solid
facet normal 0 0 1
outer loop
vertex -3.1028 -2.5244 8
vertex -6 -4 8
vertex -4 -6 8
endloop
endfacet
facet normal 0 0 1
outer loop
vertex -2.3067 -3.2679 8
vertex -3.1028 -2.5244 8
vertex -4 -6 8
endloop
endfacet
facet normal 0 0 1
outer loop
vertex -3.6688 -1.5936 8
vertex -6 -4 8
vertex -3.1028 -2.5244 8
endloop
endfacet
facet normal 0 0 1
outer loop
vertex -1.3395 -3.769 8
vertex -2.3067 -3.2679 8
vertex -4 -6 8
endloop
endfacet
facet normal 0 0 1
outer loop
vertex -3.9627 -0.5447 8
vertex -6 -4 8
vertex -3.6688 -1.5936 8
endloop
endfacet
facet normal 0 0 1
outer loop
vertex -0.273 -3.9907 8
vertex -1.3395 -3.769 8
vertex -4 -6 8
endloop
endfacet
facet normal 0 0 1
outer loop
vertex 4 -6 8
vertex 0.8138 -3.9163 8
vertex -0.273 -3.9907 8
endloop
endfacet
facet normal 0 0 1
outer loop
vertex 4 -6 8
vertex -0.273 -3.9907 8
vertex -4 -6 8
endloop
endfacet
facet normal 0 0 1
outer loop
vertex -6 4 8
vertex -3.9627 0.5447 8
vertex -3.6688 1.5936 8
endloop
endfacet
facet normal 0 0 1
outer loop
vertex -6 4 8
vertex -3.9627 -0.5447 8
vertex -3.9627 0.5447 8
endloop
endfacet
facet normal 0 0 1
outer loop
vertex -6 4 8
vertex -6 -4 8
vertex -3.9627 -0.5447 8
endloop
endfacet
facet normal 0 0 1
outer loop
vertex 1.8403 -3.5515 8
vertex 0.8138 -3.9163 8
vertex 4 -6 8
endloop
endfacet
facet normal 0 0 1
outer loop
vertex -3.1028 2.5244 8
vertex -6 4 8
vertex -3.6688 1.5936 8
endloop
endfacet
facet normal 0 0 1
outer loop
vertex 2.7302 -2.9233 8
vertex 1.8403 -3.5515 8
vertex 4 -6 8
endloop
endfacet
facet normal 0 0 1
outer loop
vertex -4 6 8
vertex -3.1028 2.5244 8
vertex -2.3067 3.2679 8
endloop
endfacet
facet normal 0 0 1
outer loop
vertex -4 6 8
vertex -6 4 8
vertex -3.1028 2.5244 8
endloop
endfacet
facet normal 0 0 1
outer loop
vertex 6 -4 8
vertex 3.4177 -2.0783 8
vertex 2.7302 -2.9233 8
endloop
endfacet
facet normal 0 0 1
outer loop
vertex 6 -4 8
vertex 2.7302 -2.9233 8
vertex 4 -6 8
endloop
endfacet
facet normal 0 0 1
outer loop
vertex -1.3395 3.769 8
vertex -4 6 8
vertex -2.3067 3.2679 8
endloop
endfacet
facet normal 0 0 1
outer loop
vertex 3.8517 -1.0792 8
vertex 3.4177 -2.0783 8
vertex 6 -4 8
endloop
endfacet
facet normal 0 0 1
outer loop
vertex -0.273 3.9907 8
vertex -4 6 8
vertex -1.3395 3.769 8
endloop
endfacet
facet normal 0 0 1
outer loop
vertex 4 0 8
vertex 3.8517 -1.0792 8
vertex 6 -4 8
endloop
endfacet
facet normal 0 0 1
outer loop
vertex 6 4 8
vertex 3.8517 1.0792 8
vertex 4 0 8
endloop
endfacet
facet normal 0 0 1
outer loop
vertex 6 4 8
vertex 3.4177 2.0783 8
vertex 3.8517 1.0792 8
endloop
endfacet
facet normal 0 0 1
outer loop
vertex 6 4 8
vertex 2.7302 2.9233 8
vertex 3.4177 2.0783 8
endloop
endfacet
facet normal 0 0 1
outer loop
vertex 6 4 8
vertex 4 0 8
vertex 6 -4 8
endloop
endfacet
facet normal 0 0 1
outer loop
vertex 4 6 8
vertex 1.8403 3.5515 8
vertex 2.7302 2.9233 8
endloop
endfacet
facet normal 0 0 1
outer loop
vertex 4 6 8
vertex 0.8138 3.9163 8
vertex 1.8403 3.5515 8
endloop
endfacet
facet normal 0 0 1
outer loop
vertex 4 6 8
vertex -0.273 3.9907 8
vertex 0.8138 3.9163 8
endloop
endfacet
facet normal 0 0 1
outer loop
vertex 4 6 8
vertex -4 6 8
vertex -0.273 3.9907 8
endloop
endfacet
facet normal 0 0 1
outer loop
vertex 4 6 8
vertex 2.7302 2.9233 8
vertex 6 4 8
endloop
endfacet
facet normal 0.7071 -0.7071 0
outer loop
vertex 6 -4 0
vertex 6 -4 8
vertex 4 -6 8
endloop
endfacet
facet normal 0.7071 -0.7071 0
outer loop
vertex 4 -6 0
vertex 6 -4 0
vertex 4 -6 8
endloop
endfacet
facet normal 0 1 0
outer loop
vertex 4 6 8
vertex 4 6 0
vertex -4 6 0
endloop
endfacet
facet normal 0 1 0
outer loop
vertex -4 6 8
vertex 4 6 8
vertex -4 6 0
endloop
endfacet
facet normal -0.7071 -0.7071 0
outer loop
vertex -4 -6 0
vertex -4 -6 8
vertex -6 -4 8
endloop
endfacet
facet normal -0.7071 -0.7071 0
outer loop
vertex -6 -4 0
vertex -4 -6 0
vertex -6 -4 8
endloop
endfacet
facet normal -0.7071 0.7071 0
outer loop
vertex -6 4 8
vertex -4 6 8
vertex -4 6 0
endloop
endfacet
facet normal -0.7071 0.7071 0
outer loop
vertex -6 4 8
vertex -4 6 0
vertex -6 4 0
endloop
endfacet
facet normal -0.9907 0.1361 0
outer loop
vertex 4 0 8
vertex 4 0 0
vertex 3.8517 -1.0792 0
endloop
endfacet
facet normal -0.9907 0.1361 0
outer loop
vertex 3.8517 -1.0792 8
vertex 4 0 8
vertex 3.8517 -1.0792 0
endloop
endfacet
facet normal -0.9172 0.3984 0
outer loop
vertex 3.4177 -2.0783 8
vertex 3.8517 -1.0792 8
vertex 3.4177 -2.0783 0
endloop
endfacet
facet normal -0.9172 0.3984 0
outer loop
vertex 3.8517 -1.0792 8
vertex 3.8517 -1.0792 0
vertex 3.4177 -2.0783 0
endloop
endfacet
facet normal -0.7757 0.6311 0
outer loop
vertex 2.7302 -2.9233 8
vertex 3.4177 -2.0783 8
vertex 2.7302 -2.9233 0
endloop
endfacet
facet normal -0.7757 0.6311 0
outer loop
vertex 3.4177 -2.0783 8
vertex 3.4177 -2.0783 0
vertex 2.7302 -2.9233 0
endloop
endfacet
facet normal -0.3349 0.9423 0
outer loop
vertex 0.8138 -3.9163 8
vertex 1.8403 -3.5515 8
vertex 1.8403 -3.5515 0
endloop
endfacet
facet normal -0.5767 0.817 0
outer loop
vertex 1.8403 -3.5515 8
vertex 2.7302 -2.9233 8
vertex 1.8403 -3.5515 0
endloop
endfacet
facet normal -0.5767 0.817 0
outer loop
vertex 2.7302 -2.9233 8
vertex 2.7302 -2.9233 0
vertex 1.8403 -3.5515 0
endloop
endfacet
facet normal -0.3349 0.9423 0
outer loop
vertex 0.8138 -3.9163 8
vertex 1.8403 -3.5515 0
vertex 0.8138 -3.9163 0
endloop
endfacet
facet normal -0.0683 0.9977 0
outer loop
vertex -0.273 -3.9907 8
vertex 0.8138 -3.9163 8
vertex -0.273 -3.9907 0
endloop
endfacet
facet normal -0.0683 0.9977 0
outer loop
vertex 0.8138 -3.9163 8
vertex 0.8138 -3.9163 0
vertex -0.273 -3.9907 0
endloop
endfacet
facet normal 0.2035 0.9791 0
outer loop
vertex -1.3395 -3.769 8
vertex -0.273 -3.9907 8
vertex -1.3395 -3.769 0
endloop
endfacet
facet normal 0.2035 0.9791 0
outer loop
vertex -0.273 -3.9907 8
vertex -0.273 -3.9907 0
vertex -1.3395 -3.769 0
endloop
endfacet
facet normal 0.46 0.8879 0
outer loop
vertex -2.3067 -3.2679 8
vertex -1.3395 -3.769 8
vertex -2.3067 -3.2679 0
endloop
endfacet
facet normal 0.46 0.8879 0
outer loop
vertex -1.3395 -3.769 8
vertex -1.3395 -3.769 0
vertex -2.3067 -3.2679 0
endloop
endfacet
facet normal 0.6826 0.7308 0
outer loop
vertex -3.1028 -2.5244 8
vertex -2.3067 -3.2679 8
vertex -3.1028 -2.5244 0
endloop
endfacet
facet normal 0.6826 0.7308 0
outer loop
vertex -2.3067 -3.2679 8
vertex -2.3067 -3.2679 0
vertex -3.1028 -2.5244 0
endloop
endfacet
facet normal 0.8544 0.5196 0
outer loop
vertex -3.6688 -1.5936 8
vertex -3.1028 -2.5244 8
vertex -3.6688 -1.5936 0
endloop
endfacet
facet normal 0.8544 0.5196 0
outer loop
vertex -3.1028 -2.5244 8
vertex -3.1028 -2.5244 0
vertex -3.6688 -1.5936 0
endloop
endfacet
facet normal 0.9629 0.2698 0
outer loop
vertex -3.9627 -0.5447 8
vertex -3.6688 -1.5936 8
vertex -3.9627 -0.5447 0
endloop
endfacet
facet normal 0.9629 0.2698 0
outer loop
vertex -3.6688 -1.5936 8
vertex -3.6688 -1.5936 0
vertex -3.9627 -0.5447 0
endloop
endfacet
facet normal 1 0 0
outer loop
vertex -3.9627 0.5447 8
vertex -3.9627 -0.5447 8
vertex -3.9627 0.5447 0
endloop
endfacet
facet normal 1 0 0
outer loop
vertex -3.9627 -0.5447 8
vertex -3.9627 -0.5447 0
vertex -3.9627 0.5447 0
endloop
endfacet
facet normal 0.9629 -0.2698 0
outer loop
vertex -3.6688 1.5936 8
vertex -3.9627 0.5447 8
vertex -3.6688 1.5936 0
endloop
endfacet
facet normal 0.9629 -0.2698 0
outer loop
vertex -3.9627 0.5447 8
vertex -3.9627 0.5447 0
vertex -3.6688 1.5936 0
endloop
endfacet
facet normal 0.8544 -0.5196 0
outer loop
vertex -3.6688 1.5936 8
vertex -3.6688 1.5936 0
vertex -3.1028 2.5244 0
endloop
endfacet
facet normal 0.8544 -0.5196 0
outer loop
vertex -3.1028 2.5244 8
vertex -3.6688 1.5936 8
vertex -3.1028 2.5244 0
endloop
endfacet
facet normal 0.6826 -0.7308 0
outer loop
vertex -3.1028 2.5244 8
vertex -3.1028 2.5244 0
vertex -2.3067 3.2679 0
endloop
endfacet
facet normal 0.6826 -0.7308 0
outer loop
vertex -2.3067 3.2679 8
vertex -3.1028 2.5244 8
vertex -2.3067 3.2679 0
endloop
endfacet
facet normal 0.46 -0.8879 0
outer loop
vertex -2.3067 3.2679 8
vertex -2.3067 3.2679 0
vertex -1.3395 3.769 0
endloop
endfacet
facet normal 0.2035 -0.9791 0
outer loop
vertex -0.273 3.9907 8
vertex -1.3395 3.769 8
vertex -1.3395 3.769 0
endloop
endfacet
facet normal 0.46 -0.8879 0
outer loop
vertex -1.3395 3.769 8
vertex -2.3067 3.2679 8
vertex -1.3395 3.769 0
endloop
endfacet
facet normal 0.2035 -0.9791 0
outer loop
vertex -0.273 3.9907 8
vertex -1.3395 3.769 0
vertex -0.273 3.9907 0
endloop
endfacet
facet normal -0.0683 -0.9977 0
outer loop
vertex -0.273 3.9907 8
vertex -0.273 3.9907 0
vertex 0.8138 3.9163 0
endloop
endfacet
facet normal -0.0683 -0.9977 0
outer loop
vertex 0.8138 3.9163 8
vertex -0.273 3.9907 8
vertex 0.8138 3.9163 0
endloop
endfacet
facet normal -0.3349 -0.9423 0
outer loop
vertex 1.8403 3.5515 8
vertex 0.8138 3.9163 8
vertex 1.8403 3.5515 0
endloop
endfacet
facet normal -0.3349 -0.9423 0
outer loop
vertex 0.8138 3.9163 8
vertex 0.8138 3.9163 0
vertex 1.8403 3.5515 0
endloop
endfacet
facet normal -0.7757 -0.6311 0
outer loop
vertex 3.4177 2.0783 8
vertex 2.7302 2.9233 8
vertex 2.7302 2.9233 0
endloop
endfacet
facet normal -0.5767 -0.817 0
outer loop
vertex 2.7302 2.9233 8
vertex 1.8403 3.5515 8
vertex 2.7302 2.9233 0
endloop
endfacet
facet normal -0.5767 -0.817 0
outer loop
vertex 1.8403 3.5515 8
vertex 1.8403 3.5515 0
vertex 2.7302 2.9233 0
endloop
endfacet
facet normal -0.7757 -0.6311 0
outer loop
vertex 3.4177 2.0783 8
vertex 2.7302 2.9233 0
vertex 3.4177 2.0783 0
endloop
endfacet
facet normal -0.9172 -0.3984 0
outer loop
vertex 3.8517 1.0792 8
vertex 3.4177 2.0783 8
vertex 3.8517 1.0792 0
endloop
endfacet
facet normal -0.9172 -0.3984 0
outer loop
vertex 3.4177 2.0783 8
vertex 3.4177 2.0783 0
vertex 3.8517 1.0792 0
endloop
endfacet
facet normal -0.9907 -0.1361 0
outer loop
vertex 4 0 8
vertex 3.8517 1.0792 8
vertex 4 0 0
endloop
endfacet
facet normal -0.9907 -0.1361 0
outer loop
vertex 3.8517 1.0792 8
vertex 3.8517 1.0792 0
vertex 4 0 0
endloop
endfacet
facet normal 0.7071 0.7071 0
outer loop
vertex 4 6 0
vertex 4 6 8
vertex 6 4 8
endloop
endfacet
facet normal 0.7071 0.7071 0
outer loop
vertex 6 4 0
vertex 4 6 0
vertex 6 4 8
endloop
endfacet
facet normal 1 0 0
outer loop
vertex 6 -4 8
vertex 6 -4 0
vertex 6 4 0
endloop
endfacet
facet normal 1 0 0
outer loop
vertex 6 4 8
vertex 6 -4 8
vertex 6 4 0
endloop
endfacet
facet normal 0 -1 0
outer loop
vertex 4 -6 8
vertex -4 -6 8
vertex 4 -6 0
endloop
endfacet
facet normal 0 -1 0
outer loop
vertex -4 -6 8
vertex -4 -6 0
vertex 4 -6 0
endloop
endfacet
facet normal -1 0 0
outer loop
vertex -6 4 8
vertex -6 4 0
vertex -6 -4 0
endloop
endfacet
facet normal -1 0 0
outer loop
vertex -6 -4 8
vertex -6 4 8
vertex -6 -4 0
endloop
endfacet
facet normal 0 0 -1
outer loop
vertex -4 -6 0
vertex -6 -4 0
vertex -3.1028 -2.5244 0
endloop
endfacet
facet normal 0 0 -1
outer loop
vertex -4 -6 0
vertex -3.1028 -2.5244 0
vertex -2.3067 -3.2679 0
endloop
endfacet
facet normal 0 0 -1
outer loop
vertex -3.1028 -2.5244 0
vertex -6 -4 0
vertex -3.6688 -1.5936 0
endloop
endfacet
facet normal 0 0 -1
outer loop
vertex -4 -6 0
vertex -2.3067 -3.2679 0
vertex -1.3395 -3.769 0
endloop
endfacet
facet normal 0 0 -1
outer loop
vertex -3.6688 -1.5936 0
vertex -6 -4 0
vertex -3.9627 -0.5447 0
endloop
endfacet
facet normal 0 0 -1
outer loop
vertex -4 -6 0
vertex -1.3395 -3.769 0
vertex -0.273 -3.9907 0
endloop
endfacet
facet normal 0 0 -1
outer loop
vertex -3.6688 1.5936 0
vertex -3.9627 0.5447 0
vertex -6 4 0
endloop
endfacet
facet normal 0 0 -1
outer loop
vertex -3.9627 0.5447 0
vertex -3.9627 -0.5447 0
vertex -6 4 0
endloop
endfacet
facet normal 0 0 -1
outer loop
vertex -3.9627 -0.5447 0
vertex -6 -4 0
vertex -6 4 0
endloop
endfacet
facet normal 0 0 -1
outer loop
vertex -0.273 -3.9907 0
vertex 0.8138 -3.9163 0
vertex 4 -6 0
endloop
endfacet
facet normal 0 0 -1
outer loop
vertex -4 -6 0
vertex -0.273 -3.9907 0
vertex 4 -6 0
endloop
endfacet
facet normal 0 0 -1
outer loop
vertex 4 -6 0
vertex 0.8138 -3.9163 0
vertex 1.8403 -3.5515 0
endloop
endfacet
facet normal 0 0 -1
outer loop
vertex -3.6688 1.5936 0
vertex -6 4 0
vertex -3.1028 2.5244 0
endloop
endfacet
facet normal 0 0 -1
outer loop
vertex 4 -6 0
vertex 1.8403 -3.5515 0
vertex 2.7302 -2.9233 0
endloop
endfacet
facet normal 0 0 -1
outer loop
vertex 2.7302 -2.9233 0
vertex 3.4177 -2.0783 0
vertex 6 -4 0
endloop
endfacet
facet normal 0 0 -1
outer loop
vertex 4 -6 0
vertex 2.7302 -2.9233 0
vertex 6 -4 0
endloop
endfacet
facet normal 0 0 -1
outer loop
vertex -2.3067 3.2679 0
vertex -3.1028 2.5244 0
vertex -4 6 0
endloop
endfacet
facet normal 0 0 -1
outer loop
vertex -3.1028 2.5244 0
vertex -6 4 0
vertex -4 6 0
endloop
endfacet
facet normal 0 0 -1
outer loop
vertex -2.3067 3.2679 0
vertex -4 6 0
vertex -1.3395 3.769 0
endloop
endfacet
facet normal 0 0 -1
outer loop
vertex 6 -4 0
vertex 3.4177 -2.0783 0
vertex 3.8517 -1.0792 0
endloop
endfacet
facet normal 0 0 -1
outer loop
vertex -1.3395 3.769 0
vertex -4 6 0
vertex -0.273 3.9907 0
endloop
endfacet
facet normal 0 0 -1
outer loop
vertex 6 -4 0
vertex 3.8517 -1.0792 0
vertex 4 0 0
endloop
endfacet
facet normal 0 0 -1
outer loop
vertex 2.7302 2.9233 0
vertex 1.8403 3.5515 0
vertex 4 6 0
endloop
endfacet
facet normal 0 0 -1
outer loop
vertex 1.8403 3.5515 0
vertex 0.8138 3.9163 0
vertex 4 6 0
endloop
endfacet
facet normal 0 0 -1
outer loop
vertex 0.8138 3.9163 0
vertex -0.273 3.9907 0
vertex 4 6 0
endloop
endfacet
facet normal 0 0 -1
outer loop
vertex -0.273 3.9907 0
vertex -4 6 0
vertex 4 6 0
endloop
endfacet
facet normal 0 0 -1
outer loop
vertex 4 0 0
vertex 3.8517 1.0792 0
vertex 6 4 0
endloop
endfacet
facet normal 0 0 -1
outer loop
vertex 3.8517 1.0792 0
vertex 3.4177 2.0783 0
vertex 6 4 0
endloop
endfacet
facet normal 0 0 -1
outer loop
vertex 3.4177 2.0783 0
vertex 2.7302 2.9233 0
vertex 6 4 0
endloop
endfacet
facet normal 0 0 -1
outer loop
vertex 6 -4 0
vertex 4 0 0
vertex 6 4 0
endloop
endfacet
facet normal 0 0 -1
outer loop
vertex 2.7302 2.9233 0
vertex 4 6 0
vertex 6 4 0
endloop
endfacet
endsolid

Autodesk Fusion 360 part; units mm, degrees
sketch "Sketch1" plane through (0, 0, 0) normal (0, 0, 1) x (1, 0, 0)
  circle A0 centre (0, 0) radius 4
  line L0 (4, 6) -> (-4, 6)
  line L1 (-6, 4) -> (-6, -4)
  line L2 (-4, -6) -> (4, -6)
  line L3 (6, -4) -> (6, 4)
  line L4 (6, 6) -> (-6, -6) construction
  line L5 (-6, 6) -> (6, -6) construction
  line L6 (4, 6) -> (6, 4)
  line L7 (6, -4) -> (4, -6)
  line L8 (-4, -6) -> (-6, -4)
  line L9 (-4, 6) -> (-6, 4)
  dimension "d1" = 8
  dimension "d2" = 12
  dimension "d3" = 12
  dimension "d4" = 2
  dimension "d5" = 2
  dimension "d6" = 2
  dimension "d7" = 2
  dimension "d8" = 2
  dimension "d9" = 2
  dimension "d10" = 2
  dimension "d11" = 2
extrude "Extrude1" add sketch "Sketch1" along normal blind 8
equation "d5 = d4"
equation "d7 = d6"
equation "d9 = d8"
equation "d11 = d10"
